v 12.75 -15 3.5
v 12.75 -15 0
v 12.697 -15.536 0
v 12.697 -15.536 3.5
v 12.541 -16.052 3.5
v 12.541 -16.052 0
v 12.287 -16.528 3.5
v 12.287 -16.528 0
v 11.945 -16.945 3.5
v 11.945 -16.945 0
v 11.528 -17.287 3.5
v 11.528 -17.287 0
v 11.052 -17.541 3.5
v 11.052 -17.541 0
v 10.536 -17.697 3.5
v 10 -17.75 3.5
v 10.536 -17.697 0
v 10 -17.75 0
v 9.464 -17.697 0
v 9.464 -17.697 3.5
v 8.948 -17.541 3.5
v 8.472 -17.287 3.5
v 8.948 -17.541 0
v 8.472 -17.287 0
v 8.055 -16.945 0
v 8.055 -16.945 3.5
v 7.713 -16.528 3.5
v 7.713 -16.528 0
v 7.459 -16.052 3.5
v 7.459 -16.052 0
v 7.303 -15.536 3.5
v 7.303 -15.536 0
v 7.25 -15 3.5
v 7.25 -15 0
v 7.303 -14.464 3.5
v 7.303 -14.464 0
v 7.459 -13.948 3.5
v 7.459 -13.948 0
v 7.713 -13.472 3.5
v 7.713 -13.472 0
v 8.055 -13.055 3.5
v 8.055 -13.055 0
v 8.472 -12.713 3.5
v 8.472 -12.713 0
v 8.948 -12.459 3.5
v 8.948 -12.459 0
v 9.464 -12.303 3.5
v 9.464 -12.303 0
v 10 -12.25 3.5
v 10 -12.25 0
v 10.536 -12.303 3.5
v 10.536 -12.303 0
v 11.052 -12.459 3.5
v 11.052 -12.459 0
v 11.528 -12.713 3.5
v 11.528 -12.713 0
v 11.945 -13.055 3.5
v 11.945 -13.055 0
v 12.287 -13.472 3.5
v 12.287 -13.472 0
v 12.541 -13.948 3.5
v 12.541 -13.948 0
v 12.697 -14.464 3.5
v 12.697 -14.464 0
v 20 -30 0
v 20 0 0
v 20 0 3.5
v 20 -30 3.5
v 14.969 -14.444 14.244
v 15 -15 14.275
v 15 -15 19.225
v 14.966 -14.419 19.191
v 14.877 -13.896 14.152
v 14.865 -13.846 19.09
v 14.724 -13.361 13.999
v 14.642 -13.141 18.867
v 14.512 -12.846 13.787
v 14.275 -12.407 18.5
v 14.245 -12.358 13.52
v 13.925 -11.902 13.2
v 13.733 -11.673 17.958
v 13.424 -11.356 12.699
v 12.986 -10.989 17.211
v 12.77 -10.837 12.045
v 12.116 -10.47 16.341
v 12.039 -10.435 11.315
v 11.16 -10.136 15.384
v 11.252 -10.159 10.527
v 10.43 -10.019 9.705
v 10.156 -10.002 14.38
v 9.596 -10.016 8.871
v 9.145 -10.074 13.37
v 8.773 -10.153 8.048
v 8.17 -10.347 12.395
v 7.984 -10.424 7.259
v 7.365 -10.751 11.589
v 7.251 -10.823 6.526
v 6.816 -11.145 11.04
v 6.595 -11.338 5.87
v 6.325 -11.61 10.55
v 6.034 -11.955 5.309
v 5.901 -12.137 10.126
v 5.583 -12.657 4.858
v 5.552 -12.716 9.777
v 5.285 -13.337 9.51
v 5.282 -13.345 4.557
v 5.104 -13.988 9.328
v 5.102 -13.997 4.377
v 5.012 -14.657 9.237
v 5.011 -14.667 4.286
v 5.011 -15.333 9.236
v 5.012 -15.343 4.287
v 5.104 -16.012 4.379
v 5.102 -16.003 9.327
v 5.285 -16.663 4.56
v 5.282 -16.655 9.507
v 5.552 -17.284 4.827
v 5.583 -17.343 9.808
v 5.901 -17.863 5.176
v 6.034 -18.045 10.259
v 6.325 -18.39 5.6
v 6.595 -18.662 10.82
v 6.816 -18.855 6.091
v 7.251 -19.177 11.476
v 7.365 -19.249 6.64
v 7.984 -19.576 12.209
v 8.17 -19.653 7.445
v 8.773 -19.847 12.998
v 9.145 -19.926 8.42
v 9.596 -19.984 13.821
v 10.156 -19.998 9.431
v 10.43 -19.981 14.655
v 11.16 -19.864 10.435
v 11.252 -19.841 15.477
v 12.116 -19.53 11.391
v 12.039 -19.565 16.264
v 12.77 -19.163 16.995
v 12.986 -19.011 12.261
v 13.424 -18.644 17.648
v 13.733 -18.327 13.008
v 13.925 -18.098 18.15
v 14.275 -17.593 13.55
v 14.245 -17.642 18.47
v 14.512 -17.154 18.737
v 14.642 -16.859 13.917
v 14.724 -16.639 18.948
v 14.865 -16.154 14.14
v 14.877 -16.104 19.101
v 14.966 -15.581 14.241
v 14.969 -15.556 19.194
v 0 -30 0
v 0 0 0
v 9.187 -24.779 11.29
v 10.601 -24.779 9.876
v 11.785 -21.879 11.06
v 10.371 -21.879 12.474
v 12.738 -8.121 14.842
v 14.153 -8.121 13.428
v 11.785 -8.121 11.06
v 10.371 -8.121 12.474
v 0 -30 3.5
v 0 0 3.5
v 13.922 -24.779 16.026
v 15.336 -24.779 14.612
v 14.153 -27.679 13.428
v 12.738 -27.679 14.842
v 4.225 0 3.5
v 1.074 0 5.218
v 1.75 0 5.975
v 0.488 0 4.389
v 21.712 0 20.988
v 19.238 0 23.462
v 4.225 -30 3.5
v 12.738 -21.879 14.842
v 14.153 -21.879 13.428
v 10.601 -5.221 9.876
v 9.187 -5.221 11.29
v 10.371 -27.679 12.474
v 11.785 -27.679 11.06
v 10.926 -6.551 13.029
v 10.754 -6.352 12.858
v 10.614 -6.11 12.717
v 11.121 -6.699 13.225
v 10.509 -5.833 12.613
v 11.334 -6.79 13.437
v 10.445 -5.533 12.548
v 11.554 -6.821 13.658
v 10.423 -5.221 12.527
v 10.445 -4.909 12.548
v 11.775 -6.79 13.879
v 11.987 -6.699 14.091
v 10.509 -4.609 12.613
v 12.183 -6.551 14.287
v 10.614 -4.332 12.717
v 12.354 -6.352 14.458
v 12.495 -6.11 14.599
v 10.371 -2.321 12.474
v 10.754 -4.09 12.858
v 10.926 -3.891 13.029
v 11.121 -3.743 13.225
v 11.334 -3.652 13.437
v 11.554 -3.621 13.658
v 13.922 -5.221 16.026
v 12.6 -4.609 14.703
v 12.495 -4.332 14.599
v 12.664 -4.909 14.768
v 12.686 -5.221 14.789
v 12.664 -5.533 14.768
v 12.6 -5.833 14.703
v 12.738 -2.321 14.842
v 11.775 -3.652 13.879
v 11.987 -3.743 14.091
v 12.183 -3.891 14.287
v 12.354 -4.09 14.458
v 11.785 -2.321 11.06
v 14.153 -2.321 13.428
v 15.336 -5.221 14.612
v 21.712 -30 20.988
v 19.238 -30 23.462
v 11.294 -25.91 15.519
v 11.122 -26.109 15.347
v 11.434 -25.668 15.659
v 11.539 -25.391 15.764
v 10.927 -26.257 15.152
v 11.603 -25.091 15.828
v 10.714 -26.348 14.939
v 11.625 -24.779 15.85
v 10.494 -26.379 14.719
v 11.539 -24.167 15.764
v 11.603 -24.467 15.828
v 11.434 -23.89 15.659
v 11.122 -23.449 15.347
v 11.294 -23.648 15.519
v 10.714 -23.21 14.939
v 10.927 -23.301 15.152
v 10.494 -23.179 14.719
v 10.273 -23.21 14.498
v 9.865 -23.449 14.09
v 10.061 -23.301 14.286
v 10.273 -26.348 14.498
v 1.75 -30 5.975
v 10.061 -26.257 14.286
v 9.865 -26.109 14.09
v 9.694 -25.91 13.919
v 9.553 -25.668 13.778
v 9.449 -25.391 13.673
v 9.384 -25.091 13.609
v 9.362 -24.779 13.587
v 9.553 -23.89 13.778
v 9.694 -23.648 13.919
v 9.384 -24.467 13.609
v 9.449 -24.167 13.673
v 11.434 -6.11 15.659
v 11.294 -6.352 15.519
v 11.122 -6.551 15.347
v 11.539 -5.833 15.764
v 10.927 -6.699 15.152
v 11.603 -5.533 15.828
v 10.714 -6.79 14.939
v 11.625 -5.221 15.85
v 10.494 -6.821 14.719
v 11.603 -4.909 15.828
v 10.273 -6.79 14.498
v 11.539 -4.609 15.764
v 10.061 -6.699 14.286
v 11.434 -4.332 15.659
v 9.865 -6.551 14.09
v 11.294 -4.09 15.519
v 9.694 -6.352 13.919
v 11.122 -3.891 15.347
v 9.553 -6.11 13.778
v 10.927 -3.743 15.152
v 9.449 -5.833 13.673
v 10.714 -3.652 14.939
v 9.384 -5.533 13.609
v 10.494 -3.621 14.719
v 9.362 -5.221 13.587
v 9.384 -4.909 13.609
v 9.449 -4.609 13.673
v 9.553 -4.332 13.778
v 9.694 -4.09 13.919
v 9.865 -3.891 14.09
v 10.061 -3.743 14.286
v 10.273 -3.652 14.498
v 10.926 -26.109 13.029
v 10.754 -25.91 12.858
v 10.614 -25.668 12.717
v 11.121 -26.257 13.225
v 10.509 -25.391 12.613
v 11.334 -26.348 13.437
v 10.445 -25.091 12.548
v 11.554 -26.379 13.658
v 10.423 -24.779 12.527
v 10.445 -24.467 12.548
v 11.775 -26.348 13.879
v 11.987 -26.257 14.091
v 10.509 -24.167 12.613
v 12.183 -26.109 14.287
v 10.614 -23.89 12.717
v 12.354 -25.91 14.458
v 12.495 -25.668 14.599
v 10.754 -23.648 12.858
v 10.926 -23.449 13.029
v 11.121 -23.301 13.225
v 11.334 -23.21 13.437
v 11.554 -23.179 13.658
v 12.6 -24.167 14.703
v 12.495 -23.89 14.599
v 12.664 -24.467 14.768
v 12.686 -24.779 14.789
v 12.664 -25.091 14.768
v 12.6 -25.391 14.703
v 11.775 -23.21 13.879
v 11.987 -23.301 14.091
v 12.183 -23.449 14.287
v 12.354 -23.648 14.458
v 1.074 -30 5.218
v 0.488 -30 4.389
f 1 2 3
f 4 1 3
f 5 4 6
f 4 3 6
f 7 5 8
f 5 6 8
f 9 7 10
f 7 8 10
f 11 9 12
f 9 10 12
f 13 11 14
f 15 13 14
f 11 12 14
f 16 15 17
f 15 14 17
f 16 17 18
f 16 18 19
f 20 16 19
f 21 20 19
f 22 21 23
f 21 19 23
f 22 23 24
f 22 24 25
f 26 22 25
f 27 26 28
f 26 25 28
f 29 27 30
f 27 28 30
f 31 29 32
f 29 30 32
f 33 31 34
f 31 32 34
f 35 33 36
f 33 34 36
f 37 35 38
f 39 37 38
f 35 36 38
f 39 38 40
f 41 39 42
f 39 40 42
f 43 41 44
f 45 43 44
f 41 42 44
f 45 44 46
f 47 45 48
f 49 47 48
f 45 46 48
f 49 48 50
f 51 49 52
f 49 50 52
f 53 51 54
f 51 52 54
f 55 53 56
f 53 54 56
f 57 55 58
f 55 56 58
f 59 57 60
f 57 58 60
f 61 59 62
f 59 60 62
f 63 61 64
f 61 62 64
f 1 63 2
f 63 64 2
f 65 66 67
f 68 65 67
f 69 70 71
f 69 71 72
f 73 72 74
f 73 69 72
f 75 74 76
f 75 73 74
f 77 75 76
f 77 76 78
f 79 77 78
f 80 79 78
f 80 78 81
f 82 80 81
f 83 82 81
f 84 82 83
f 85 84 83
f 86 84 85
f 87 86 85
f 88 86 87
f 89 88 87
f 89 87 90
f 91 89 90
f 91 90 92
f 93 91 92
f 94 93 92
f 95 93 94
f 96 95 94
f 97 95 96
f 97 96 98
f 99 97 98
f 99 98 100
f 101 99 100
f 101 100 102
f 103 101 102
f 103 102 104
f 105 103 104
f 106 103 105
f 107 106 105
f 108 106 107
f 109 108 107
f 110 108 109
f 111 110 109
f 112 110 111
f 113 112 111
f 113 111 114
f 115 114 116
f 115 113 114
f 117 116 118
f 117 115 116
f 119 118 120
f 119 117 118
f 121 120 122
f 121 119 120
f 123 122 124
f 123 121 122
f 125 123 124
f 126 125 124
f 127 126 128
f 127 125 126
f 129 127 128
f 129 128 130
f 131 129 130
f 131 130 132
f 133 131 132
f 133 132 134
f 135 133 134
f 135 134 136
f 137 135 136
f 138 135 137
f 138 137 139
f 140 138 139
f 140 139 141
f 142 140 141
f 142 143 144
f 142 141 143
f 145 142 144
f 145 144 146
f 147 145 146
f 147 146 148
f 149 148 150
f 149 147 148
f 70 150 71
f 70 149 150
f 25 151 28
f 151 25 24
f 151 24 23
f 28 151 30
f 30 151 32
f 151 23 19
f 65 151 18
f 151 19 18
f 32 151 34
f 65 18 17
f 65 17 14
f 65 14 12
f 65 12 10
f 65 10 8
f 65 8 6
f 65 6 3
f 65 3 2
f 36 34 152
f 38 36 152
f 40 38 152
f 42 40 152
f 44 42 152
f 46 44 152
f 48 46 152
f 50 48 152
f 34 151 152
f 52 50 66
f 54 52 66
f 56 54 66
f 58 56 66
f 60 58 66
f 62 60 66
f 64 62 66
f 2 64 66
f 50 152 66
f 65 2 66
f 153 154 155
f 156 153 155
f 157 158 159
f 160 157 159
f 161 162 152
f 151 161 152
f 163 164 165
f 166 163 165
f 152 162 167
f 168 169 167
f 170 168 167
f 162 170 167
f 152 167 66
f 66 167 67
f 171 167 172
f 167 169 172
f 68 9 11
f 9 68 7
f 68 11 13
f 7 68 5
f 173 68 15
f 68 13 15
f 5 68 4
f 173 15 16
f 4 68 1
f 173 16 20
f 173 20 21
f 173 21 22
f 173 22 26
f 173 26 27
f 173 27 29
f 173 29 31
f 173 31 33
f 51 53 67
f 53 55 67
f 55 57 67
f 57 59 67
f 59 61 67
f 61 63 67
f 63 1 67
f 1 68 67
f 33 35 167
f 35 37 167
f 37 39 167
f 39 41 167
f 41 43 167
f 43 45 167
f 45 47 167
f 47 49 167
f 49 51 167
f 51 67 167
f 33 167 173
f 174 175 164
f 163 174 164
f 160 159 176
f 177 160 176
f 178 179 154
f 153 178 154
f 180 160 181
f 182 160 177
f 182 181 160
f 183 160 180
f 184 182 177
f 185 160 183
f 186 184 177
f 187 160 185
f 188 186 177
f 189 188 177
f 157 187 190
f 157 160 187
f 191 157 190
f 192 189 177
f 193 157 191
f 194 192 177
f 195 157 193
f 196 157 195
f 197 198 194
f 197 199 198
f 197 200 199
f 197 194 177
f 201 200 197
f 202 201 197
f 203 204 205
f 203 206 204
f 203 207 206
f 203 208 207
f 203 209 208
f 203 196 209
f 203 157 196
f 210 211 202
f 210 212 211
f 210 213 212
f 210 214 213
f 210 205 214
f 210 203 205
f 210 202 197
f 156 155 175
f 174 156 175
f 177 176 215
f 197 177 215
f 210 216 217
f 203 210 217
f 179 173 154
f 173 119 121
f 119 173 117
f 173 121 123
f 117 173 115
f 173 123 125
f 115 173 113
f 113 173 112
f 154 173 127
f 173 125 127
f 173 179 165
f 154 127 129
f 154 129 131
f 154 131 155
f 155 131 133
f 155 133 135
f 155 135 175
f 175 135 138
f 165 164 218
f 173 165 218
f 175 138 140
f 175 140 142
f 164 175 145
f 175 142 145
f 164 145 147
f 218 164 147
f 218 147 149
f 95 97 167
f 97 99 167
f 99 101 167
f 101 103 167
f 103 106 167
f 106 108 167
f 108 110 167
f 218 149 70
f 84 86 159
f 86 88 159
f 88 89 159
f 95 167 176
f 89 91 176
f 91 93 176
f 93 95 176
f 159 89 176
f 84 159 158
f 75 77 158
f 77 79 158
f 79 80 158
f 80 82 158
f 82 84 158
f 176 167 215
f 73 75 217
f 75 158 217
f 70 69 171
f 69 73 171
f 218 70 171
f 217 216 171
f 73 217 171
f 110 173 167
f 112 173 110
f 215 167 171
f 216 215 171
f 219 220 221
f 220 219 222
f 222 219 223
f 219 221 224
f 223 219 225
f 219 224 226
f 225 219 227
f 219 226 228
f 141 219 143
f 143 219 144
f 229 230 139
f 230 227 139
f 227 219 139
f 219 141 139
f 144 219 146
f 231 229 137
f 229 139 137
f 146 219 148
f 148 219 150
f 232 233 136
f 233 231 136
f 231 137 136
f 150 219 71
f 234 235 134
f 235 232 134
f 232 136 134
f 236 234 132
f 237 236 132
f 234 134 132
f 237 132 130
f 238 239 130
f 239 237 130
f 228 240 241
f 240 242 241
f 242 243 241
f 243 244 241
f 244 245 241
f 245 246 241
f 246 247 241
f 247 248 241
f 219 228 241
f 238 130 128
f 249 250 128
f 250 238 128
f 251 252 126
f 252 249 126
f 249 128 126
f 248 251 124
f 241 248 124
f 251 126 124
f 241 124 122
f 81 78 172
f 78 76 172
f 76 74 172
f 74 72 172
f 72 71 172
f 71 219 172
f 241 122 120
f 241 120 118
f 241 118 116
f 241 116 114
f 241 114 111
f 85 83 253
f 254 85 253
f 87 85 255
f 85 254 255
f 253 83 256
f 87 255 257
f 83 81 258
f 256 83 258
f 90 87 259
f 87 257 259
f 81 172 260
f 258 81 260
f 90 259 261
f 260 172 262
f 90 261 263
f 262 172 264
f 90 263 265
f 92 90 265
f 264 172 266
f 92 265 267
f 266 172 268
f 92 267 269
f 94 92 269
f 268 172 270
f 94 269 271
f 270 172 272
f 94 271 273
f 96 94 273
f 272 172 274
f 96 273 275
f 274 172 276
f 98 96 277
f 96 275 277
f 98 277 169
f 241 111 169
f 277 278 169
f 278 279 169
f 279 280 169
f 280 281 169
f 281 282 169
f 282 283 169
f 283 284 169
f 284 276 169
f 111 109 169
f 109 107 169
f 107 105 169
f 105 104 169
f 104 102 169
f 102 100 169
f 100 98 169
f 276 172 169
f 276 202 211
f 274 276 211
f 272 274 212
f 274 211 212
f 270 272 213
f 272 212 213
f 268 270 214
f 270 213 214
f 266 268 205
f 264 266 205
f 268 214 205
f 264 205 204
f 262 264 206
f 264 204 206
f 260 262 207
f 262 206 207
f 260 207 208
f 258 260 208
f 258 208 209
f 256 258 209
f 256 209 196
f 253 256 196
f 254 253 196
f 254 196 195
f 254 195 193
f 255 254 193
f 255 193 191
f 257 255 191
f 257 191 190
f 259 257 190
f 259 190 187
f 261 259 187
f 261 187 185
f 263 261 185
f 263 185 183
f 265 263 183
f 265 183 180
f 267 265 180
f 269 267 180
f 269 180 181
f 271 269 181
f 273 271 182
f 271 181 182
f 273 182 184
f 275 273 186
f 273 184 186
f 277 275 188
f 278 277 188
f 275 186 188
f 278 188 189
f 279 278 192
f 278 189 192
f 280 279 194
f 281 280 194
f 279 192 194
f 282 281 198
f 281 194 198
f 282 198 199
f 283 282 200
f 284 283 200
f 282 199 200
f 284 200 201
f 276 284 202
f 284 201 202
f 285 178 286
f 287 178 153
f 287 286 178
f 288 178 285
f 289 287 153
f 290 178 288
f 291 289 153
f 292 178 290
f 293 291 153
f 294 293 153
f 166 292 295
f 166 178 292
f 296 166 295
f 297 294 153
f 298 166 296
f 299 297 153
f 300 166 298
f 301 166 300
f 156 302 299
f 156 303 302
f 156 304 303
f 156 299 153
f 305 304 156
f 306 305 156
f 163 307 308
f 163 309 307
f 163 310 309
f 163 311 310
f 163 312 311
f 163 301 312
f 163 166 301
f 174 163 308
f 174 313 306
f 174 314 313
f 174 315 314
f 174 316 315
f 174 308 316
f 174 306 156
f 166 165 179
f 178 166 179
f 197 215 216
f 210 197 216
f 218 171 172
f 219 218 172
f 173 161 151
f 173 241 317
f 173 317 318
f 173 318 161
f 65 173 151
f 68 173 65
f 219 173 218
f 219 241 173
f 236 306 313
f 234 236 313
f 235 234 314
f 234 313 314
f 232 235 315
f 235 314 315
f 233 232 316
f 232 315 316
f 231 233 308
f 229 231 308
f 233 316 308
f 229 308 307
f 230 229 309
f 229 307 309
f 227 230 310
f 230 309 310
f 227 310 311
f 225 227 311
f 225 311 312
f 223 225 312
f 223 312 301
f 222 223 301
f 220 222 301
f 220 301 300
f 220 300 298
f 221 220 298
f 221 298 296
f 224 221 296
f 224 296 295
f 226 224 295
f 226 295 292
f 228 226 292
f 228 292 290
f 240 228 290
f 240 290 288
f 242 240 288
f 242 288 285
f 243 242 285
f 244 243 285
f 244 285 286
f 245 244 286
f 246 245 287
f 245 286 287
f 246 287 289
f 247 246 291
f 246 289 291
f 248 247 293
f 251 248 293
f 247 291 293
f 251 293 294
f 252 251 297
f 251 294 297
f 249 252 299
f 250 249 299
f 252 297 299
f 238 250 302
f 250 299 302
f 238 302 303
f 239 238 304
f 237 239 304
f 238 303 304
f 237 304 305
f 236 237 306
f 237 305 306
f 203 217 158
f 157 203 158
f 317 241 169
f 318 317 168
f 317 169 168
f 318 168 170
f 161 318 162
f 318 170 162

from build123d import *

# Parameters (mm, degrees)
F1_DEPTH = 30
F2_R     = 2.75
F3_DEPTH = 3.5
F4_R     = 5
F5_DEPTH = 16.7248737342
F6_R     = 1.6
F7_DEPTH = 3.5
F8_DEPTH = 2


with BuildPart() as f1:
    # F0 (on Front) → F1 (new body)
    with BuildSketch(Plane.XZ):
        Polygon((0, 3.5), (0, 0), (20, 0), (20, 3.5), (4.2248737342, 3.5), align=None)
        with BuildLine():
            ThreePointArc((1.75, 5.9748737342), (0.7696146381, 4.8119555711), (0, 3.5))
            Line((0, 3.5), (4.2248737342, 3.5))
            Line((4.2248737342, 3.5), (1.75, 5.9748737342))
        make_face()
        Polygon((1.75, 5.9748737342), (4.2248737342, 3.5), (21.7124208231, 20.987547089), (19.237547089, 23.4624208231), align=None)
    extrude(amount=F1_DEPTH)

    # F2 (on face) → F3 (cut, through all)
    with BuildSketch(Plane(origin=(0, 0, 0), x_dir=(1, 0, 0), z_dir=(0, 0, -1))):
        with Locations((10, 15)):
            Circle(F2_R)
    extrude(amount=-F3_DEPTH, mode=Mode.SUBTRACT)

    # F4 (on face) → F5 (cut, up to face)
    with BuildSketch(Plane.XY.offset(3.5)):
        with Locations((10, -15)):
            Circle(F4_R)
    extrude(amount=F5_DEPTH, mode=Mode.SUBTRACT)

    # F6 (on face) → F7 (cut, through all)
    with BuildSketch(Plane(origin=(0.3624368671, 0, -0.3624368671), x_dir=(0, 1, 0), z_dir=(0.7071067812, 0, -0.7071067812))):
        with Locations((-5.221, 17.8278737342)):
            Circle(F6_R)
        with Locations((-24.779, 17.8278737342)):
            Circle(F6_R)
    extrude(amount=-F7_DEPTH, mode=Mode.SUBTRACT)

    # F6 (on face) → F8 (cut)
    with BuildSketch(Plane(origin=(0.3624368671, 0, -0.3624368671), x_dir=(0, 1, 0), z_dir=(0.7071067812, 0, -0.7071067812))):
        Polygon((-21.879, 19.5021895148), (-24.779, 21.1765052955), (-27.679, 19.5021895148), (-27.679, 16.1535579535), (-24.779, 14.4792421729), (-21.879, 16.1535579535), align=None)
        with Locations((-24.779, 17.8278737342)):
            Circle(F6_R, mode=Mode.SUBTRACT)
        Polygon((-8.121, 16.1535579535), (-5.221, 14.4792421729), (-2.321, 16.1535579535), (-2.321, 19.5021895148), (-5.221, 21.1765052955), (-8.121, 19.5021895148), align=None)
        with Locations((-5.221, 17.8278737342)):
            Circle(F6_R, mode=Mode.SUBTRACT)
    extrude(amount=-F8_DEPTH, mode=Mode.SUBTRACT)


solid = f1.part
